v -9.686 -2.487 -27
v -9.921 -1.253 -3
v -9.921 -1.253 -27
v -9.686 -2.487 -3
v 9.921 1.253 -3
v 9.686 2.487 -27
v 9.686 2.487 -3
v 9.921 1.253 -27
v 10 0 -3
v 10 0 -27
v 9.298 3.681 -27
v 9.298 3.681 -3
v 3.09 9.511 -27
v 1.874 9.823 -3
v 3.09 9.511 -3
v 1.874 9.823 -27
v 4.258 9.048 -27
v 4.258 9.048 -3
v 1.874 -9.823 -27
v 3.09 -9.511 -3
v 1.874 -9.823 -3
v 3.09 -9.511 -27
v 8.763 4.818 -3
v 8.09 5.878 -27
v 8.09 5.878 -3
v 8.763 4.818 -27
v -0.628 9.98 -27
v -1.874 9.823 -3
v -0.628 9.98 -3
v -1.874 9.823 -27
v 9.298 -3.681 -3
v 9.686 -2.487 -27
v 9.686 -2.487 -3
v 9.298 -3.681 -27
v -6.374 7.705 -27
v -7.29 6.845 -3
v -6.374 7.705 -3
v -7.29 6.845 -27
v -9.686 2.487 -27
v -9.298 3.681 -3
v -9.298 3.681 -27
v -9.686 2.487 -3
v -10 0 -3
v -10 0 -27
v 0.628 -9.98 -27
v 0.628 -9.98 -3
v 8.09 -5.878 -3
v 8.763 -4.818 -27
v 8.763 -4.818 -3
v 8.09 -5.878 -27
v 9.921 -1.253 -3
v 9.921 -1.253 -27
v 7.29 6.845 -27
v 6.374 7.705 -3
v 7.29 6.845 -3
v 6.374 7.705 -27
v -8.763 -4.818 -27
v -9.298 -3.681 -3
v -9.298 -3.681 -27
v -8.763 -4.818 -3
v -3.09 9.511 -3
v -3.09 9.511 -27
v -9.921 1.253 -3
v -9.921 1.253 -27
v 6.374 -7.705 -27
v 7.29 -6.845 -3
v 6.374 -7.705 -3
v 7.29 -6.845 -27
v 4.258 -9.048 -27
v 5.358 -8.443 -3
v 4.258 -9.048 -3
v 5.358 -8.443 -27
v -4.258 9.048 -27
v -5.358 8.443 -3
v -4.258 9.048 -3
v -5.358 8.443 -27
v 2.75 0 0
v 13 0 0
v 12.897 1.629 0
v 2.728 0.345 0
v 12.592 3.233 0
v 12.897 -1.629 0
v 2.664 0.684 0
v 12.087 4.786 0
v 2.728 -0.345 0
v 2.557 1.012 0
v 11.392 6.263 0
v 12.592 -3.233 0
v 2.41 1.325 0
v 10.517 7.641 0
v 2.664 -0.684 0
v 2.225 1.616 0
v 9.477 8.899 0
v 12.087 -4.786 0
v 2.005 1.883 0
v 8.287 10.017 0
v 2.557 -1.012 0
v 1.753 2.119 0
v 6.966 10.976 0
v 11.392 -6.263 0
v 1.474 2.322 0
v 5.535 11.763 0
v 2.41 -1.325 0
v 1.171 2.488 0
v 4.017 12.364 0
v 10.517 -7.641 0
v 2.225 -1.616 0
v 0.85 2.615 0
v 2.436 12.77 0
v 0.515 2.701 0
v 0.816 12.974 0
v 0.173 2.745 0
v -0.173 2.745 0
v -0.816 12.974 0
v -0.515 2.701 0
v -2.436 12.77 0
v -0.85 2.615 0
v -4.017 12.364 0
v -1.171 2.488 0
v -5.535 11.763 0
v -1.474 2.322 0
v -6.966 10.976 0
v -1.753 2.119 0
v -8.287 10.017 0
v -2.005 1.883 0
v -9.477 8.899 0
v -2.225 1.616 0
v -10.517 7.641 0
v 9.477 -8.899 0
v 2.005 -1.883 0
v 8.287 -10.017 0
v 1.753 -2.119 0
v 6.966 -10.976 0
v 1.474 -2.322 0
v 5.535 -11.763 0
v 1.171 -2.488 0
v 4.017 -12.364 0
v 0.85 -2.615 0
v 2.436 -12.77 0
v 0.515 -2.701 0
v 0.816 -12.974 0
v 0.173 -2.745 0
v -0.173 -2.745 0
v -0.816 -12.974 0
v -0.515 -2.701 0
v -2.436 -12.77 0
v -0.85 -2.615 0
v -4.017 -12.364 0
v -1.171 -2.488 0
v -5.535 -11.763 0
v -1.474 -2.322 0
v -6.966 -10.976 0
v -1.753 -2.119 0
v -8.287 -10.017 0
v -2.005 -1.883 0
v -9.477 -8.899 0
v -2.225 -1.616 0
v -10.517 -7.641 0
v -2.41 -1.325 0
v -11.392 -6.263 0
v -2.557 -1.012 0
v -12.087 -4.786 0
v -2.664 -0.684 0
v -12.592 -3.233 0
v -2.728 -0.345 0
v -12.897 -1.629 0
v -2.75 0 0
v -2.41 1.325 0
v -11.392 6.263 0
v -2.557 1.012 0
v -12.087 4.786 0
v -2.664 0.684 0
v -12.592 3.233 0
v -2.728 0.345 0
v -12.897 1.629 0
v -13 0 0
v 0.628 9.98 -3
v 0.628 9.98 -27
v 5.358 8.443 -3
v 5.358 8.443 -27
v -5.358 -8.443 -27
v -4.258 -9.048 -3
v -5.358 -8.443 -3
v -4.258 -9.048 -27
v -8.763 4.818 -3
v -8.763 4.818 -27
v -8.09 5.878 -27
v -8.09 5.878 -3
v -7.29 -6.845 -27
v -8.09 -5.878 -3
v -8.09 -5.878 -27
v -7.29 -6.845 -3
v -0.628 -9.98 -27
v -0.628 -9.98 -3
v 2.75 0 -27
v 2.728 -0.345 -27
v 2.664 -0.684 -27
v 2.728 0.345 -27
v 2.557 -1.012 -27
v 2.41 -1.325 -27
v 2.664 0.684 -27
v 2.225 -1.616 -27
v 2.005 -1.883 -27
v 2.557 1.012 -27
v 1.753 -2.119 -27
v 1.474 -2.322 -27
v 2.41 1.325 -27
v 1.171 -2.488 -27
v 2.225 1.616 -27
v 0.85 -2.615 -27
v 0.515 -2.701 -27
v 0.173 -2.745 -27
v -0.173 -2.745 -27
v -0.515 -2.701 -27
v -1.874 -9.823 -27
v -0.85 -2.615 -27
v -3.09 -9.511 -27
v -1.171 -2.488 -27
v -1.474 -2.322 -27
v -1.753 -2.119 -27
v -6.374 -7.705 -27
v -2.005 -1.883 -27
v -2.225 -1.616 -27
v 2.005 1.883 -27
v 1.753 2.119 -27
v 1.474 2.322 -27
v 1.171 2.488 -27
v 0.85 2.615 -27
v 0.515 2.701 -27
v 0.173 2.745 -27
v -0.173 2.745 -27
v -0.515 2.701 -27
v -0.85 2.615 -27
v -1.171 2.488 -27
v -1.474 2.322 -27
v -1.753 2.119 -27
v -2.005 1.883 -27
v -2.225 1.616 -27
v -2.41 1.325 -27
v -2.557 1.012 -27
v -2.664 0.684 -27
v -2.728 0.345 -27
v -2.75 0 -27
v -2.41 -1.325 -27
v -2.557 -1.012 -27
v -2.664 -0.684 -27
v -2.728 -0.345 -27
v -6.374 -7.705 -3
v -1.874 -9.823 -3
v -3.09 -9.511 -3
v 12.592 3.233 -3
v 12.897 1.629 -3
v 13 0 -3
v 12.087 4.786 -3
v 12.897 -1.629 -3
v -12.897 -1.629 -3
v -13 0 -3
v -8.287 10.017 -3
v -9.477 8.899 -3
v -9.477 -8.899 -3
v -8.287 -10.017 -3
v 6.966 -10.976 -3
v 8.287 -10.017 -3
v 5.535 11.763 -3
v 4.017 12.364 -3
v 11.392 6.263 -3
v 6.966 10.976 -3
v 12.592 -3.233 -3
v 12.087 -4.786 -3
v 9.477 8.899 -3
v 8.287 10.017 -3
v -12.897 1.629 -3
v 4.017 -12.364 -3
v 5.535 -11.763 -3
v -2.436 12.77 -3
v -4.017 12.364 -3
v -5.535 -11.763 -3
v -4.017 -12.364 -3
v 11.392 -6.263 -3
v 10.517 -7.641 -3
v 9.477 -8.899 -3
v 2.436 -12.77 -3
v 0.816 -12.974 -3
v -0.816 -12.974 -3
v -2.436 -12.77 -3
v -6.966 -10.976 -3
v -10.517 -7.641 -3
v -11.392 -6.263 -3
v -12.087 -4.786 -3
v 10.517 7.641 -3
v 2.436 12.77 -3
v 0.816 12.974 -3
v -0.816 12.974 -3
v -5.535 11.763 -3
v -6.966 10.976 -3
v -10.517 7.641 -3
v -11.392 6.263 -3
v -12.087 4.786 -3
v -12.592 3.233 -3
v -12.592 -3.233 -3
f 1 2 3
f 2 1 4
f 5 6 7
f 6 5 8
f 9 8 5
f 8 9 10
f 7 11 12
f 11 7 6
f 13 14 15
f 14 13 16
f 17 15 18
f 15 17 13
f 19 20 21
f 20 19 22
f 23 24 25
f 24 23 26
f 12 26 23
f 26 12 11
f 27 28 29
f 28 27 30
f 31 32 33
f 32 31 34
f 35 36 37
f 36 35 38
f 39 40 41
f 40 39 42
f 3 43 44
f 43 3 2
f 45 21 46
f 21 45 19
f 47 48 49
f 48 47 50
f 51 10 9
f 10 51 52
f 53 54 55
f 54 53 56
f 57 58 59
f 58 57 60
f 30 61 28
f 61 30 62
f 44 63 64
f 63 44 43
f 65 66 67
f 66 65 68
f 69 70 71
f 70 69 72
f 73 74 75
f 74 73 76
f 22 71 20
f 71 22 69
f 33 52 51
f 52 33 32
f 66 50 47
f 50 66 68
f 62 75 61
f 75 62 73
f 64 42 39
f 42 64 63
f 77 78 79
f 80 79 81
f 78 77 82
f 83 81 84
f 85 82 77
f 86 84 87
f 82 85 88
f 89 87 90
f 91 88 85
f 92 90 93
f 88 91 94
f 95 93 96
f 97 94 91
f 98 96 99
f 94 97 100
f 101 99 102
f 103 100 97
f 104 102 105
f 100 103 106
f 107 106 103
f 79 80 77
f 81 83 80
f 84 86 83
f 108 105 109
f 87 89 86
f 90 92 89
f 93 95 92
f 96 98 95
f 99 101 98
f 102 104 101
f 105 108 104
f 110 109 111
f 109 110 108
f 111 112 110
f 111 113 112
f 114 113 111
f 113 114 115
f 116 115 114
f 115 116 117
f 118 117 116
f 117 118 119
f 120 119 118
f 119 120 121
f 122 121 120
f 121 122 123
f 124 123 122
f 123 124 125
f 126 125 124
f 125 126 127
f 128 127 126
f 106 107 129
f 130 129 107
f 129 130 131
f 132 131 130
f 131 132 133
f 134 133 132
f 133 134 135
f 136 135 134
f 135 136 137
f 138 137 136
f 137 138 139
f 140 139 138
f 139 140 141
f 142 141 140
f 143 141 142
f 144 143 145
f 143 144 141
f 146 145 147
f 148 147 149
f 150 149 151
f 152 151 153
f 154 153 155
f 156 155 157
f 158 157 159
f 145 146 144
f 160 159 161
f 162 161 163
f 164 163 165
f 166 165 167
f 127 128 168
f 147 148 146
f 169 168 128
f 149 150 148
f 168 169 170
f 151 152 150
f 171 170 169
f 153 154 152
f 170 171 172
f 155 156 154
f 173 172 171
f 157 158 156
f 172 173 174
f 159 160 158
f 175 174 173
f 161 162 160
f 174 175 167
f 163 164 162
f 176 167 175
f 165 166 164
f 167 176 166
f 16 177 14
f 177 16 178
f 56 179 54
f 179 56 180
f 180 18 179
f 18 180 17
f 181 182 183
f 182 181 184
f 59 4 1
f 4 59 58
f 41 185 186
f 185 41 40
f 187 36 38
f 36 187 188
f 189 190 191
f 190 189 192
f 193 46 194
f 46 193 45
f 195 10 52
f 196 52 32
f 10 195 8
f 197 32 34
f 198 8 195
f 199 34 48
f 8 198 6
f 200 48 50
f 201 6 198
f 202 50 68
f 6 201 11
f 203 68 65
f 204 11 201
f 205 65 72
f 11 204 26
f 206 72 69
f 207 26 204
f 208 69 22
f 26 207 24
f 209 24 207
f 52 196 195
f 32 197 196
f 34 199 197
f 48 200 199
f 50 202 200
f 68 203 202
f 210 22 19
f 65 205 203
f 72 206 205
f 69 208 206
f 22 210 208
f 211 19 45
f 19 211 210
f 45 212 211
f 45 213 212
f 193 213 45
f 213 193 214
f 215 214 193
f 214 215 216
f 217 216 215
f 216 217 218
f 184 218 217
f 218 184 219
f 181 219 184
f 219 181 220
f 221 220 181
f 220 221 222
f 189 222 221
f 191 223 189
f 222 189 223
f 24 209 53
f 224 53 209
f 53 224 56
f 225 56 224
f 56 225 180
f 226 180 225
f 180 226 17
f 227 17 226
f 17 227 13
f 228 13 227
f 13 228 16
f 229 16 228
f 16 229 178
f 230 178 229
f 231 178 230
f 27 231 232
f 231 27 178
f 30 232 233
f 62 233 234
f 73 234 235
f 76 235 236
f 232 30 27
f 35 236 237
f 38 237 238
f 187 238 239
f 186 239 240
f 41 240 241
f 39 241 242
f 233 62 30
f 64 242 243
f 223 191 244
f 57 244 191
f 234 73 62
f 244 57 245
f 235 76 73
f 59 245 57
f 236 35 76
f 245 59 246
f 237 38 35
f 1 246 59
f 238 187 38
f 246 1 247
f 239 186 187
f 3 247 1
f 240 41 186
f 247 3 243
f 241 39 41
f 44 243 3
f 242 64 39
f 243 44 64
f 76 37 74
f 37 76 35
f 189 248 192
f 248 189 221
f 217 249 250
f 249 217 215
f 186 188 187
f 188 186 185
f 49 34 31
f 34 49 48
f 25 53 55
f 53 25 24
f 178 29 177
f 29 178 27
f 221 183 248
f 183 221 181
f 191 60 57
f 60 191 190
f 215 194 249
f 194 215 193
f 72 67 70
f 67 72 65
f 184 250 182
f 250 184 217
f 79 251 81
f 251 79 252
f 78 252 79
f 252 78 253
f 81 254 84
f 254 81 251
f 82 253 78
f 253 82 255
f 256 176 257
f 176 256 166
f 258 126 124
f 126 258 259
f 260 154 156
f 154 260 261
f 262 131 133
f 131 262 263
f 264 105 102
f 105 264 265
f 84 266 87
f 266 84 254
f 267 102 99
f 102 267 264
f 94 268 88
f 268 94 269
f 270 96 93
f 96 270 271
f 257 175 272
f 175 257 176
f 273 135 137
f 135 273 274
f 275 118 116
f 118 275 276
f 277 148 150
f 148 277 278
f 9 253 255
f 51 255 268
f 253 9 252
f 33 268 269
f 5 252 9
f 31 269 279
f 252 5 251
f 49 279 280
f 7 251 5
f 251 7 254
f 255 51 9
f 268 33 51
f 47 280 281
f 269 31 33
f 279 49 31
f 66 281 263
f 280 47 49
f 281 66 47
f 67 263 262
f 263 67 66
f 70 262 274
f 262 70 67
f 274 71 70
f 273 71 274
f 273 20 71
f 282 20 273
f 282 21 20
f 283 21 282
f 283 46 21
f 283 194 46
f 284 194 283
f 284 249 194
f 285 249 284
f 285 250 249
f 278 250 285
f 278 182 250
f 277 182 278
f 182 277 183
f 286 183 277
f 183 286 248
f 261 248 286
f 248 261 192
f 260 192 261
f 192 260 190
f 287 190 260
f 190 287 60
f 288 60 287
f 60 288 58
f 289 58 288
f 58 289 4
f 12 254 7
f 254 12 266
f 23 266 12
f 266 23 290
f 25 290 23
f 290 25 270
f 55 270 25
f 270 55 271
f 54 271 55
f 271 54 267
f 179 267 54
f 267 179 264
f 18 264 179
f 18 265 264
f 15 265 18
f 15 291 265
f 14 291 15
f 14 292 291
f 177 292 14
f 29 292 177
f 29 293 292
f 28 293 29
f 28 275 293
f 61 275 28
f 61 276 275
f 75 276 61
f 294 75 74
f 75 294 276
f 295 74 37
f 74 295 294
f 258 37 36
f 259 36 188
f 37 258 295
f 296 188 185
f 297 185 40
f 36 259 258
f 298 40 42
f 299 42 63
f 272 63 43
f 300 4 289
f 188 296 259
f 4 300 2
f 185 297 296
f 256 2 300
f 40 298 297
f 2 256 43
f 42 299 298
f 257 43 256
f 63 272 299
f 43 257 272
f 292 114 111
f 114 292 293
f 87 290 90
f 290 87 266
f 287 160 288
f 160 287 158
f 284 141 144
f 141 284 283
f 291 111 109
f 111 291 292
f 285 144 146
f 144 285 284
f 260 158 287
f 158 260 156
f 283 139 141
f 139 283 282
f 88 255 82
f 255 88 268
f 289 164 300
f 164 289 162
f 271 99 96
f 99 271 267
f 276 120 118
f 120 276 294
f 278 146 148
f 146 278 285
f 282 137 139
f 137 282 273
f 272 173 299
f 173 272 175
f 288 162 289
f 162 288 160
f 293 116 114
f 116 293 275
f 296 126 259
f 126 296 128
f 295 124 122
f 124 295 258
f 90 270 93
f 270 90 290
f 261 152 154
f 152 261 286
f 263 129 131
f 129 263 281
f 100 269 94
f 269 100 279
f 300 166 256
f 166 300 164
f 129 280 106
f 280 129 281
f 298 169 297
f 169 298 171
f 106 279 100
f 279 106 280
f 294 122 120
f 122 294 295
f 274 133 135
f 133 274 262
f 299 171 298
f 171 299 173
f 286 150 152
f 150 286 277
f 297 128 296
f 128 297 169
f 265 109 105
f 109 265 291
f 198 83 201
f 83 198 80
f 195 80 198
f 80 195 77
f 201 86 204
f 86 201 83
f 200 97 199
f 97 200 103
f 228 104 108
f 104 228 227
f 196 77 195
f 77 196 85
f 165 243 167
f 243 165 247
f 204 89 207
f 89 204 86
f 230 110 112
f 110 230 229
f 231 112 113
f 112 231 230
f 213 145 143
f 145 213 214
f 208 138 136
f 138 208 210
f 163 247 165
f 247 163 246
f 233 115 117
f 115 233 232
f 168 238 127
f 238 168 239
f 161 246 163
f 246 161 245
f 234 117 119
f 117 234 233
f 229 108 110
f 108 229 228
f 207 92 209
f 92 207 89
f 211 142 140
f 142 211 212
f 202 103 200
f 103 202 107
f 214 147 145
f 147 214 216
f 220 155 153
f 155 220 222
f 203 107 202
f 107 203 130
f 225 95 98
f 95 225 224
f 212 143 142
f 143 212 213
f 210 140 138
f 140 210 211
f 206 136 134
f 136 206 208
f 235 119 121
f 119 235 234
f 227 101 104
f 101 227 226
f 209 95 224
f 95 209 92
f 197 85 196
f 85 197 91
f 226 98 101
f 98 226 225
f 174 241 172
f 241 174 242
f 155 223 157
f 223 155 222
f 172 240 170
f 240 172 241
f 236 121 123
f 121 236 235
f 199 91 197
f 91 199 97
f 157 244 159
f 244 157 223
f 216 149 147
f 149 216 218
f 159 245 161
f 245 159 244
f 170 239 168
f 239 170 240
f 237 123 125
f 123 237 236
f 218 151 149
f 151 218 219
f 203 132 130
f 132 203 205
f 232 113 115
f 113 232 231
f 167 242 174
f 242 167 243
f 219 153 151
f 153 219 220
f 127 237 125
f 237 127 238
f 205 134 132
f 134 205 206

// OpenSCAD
$fn = 50;


difference() {
	union() {
		translate(v = [0, 0, -27.0000000000]) {
			cylinder(h = 27, r = 10.0000000000);
		}
		translate(v = [0, 0, -3.0000000000]) {
			cylinder(h = 3, r = 13.0000000000);
		}
	}
	union() {
		#translate(v = [0, 0, -27]) {
			cylinder(h = 27, r = 2.7500000000);
		}
	}
}
